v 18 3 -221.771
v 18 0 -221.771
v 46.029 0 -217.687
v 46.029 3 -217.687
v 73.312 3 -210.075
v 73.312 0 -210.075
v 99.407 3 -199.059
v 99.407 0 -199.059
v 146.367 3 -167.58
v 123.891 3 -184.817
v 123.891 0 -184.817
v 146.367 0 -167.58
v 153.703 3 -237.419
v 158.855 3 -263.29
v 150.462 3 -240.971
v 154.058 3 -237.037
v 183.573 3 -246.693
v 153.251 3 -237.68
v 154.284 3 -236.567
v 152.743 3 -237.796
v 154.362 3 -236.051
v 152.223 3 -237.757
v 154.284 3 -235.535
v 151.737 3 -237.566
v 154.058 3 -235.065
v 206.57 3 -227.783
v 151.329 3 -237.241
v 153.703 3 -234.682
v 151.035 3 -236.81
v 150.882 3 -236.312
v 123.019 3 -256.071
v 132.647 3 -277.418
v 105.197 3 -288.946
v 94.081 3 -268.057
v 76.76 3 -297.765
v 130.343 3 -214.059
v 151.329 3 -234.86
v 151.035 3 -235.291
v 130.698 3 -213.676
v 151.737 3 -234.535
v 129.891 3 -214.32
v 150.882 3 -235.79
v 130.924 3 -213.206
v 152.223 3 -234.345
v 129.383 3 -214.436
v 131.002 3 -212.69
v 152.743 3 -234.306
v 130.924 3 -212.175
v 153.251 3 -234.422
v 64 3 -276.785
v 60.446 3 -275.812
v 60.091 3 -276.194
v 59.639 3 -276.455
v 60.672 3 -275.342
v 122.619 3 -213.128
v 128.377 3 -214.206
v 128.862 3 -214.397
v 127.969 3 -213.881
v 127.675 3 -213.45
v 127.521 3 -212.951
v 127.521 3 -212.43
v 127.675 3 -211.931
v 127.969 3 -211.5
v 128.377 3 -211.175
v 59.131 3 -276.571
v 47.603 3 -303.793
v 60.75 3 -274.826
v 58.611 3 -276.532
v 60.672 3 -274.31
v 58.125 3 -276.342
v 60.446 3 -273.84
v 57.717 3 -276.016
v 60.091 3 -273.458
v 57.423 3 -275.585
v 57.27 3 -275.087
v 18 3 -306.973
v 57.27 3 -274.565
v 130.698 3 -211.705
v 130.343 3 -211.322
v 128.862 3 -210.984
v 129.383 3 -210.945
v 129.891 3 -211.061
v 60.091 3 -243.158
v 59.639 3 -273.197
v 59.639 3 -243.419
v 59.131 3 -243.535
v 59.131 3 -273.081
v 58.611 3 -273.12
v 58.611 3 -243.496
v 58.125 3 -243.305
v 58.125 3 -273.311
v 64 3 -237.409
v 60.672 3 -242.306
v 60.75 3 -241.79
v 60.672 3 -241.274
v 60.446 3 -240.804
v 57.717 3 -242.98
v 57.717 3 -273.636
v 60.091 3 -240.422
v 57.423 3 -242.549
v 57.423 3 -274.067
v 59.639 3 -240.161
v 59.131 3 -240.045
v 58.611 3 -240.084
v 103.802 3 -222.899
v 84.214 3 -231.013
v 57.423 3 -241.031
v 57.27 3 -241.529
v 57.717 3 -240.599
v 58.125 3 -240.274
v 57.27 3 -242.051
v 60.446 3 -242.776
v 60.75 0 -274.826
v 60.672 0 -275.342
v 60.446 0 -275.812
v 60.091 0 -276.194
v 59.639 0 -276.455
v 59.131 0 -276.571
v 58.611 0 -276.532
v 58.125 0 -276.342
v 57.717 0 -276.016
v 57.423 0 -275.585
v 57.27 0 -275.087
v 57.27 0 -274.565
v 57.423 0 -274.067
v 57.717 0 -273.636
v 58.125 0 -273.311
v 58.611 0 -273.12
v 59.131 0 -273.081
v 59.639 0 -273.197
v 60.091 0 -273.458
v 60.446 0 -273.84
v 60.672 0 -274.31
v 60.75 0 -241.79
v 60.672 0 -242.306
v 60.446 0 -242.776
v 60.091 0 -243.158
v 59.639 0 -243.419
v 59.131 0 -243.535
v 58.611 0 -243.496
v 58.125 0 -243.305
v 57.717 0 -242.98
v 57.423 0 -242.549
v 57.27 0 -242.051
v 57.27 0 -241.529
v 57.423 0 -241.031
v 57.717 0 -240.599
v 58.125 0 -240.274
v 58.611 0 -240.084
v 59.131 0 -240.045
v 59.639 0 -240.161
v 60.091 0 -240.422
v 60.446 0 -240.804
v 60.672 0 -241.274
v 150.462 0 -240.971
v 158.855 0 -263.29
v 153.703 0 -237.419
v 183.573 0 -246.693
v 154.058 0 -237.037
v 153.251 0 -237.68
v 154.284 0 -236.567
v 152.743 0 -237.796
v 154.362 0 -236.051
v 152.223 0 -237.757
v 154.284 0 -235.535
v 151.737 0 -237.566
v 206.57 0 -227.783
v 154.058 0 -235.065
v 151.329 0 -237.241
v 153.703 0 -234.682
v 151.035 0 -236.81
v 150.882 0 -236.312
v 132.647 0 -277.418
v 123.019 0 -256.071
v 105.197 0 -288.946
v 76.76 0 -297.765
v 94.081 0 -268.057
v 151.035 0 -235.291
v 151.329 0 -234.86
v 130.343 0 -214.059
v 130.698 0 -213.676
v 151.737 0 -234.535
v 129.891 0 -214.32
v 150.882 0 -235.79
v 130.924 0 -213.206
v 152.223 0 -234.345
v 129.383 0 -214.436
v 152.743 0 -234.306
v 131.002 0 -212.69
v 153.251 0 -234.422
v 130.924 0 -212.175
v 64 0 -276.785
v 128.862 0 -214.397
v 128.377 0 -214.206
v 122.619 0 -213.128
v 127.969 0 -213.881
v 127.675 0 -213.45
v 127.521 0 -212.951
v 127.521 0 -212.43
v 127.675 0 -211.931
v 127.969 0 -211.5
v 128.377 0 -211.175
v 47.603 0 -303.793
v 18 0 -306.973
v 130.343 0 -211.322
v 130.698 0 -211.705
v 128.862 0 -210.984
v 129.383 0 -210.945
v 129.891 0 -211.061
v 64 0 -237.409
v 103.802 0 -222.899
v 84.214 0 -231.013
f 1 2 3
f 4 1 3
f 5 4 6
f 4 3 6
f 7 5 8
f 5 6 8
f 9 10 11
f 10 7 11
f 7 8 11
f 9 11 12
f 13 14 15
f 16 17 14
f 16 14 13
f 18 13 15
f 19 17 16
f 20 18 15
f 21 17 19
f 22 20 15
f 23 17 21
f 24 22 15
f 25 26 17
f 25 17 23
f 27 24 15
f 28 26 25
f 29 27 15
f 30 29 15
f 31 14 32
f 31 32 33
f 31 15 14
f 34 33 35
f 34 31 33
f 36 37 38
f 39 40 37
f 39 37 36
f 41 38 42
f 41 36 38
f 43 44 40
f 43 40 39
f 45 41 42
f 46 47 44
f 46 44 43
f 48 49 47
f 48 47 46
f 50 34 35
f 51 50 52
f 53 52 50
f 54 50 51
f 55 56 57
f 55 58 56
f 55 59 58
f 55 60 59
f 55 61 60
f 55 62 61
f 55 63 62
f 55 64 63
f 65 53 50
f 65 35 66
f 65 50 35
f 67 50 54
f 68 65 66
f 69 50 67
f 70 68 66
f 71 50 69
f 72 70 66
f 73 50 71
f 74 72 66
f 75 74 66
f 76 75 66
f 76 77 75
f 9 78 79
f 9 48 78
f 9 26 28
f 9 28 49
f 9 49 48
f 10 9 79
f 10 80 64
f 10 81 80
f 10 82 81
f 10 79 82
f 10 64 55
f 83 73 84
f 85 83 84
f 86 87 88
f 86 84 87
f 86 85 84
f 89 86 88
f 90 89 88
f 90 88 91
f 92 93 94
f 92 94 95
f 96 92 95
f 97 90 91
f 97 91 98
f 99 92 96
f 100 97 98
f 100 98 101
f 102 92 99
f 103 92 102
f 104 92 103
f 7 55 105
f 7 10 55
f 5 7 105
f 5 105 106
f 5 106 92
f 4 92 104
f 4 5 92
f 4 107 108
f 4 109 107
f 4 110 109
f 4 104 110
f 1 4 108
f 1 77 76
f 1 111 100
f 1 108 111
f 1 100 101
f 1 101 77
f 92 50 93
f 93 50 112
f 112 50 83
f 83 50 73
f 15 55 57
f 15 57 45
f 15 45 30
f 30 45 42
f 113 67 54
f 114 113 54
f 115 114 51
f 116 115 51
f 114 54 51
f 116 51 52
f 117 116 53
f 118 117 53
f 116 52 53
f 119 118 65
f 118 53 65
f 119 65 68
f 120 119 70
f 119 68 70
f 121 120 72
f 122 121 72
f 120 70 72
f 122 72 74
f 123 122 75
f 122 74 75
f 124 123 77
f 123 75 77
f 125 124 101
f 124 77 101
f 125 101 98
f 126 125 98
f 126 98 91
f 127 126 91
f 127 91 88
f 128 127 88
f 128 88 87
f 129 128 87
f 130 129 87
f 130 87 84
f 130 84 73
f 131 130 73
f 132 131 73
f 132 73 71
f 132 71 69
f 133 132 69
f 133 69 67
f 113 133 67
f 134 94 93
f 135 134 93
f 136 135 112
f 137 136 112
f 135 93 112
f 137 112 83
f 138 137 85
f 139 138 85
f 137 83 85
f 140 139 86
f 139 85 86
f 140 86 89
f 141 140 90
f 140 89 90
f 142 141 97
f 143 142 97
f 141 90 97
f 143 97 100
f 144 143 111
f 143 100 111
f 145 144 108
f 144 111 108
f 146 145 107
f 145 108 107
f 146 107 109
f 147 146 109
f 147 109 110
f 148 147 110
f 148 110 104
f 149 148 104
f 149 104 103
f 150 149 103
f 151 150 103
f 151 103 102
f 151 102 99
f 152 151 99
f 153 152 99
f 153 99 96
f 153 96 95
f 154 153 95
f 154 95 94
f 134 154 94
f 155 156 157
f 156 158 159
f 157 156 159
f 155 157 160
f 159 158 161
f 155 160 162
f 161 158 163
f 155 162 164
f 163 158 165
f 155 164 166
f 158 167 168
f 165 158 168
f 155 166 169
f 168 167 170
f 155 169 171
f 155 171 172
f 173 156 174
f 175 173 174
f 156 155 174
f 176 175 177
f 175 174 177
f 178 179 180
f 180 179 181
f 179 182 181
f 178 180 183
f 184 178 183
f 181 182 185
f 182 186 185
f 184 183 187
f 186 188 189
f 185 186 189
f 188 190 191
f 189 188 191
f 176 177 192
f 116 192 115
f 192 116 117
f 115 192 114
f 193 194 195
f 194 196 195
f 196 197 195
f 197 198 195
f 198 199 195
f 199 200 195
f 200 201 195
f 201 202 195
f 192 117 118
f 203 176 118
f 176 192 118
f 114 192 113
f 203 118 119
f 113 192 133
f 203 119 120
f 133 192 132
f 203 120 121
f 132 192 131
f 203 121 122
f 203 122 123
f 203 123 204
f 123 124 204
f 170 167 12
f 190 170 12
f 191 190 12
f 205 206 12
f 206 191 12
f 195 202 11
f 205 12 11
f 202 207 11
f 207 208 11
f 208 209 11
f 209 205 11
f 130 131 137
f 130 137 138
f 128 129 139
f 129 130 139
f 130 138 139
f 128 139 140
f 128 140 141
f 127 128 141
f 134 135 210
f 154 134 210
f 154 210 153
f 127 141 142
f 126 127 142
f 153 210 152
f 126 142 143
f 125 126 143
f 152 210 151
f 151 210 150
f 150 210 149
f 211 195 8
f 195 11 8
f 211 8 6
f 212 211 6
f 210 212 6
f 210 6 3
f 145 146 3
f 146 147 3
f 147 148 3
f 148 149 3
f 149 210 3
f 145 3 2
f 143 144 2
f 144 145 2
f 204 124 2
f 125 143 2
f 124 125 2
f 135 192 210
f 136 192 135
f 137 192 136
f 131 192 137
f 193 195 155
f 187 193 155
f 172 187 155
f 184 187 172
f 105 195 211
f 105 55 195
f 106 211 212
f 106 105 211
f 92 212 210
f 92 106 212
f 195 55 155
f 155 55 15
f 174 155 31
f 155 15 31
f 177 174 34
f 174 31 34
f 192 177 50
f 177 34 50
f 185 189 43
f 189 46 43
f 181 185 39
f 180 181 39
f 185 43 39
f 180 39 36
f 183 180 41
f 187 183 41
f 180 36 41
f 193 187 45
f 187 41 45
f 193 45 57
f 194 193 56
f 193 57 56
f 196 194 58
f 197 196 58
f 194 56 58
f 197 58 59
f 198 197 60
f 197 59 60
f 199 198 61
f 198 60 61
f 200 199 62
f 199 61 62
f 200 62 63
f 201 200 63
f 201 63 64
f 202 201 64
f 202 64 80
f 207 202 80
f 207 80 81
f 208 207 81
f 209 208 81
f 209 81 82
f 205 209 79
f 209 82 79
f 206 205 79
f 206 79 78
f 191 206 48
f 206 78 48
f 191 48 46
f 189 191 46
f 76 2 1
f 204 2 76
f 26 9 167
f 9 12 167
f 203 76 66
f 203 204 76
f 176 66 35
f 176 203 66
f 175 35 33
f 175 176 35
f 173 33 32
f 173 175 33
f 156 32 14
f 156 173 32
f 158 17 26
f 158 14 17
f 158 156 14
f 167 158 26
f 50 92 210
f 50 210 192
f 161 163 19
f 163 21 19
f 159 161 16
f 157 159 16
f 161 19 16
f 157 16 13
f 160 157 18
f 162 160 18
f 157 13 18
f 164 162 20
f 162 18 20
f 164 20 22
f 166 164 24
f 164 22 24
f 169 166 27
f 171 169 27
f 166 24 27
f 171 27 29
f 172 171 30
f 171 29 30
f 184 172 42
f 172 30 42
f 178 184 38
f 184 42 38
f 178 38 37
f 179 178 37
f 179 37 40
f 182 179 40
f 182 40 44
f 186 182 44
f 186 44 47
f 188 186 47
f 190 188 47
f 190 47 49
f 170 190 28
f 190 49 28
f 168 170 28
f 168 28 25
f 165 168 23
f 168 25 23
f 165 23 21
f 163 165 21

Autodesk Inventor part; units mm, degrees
ref_plane "YZ Plane" through (0, 0, 0) normal (1, 0, 0) x (0, 1, 0)
ref_plane "XZ Plane" through (0, 0, 0) normal (0, 1, 0) x (-1, 0, 0)
ref_plane "XY Plane" through (0, 0, 0) normal (0, 0, 1) x (1, 0, 0)
sketch "Sketch1" plane through (0, 0, 0) normal (0, 1, 0) x (-1, 0, 0)
  circle A0 centre (0, 0) radius 215
  circle A1 centre (0, 0) radius 315
  line L0 (0, 0) -> (0, -315)
  line L1 (0, 0) -> (-222.7386, -222.7386)
  line L2 (-141.0509, -162.2641) -> (-211.8794, -233.0926)
  line L3 (-15, -214.4761) -> (-15, -314.6427)
  circle A2 centre (0, 0) radius 222.5
  circle A3 centre (0, 0) radius 307.5
  line L4 (-18, -214.2452) -> (-18, -314.4853)
  point P0 (-152.028, -152.028)
  point P1 (0, -215)
  point P2 (0, -312.5)
  point P3 (0, -217.5)
  point P4 (-153.7957, -153.7957)
  point P5 (-220.9709, -220.9709)
  point P6 (-210.1096, -231.3228)
  point P7 (-15, -312.1398)
  point P8 (-15, -216.9821)
  point P9 (-142.8229, -164.0361)
  point P10 (-206.5699, -227.7831)
  point P11 (-15, -307.1339)
  point P12 (-15, -221.9938)
  point P13 (-146.3667, -167.5799)
  point P14 (-18, -306.9727)
  point P15 (-18, -221.7707)
  dimension "d2" = 430
  dimension "d3" = 630
  dimension "d4" = 45
  dimension "d5" = 15
  dimension "d6" = 15
  dimension "d11" = 7.5
  dimension "d12" = 7.5
  dimension "d13" = 3
extrude "Extrusion1" add sketch "Sketch1" along normal blind 3 contours A2 L4 A3 L2
sketch "Sketch5" plane through (0, 3, 0) normal (0, 1, 0) x (1, 0, 0)
  arc A0 (146.3667, 167.5799) -> (18, 221.7707) centre (0, 0) ccw projected
  line L0 (146.3667, 167.5799) -> (206.5699, 227.7831) projected
  arc A1 (206.5699, 227.7831) -> (18, 306.9727) centre (0, 0) ccw projected
  line L1 (18, 306.9727) -> (18, 221.7707) projected
  circle A2 centre (0, 0) radius 297.5
  circle A3 centre (0, 0) radius 232.5
  line L2 (28, 296.1794) -> (28, 230.8078)
  line L3 (145.7715, 181.1268) -> (191.9425, 227.2979)
  line L4 (18, 306.9727) -> (18, 221.7707) projected
  line L5 (18, 296.955) -> (18, 231.8022)
  line L6 (146.3667, 167.5799) -> (206.5699, 227.7831) projected
  line L7 (199.4901, 220.7033) -> (153.4532, 174.6664)
  dimension "d43" = 10
  dimension "d44" = 10
  dimension "d45" = 10
  dimension "d46" = 10
sketch "Sketch6" plane through (0, 3, 0) normal (0, 1, 0) x (1, 0, 0)
  arc A0 (146.3667, 167.5799) -> (18, 221.7707) centre (0, 0) ccw projected
  line L0 (146.3667, 167.5799) -> (206.5699, 227.7831) projected
  arc A1 (206.5699, 227.7831) -> (18, 306.9727) centre (0, 0) ccw projected
  line L1 (18, 306.9727) -> (18, 221.7707) projected
  circle A2 centre (0, 0) radius 222.5
  circle A3 centre (0, 0) radius 309.5
  circle A4 centre (0, 0) radius 240
  circle A5 centre (0, 0) radius 290
  line L2 (18, 306.9727) -> (18, 221.7707) projected
  line L3 (18, 239.324) -> (18, 289.4408)
  line L4 (146.3667, 167.5799) -> (206.5699, 227.7831) projected
  line L5 (158.7672, 179.9804) -> (194.1799, 215.3931)
  line L6 (50, 234.7339) -> (50, 285.6571)
  line L7 (130.6266, 201.3373) -> (166.6348, 237.3454)
  line L8 (55, 233.6129) -> (55, 284.7367)
  line L9 (126.2984, 204.0802) -> (162.4484, 240.2301)
  circle A6 centre (0, 0) radius 245
  circle A7 centre (0, 0) radius 285
  line L10 (55, 274.8261) -> (59, 274.8261) construction
  line L11 (59, 274.8261) -> (59, 278.8261) construction
  line L12 (55, 241.7898) -> (59, 241.7898) construction
  line L13 (59, 241.7898) -> (59, 237.7898) construction
  line L14 (132.0804, 209.8621) -> (129.2519, 212.6905) construction
  line L15 (129.2519, 212.6905) -> (126.4235, 209.8621) construction
  line L16 (155.4405, 233.2223) -> (152.6121, 236.0507) construction
  line L17 (152.6121, 236.0507) -> (155.4405, 238.8791) construction
  circle A8 centre (152.6121, 236.0507) radius 1.75
  circle A9 centre (129.2519, 212.6905) radius 1.75
  circle A10 centre (59, 274.8261) radius 1.75
  circle A11 centre (59, 241.7898) radius 1.75
  line L18 (15, 221.9938) -> (15, 309.1363)
  line L19 (0, 449.6314) -> (0, -436.0219) projected
  point P0 (176.4736, 197.6868)
  dimension "d47" = 445
  dimension "d48" = 619
  dimension "d49" = 480
  dimension "d50" = 580
  dimension "d53" = 5
  dimension "d54" = 5
  dimension "d55" = 5
  dimension "d56" = 5
  dimension "d57" = 4
  dimension "d58" = 4
  dimension "d59" = 4
  dimension "d60" = 4
  dimension "d61" = 4
  dimension "d63" = 4
  dimension "d67" = 90
  dimension "d68" = 4
  dimension "d69" = 4
  dimension "d70" = 3.5
  dimension "d71" = 3.5
  dimension "d72" = 3.5
  dimension "d73" = 3.5
  dimension "d76" = 35
  dimension "d77" = 15
  dimension "d78" = 35
extrude "Extrusion4" cut sketch "Sketch6" against normal up to next contours A8 | A9 | A10 | A11
sketch "Sketch8" plane through (0, 3, 0) normal (0, 1, 0) x (1, 0, 0)
  circle A0 centre (129.2519, 212.6905) radius 1.75 projected
  circle A1 centre (59, 274.8261) radius 1.75 projected
  circle A2 centre (152.6121, 236.0507) radius 1.75 projected
  circle A3 centre (59, 241.7898) radius 1.75 projected
  arc A4 (146.3667, 167.5799) -> (18, 221.7707) centre (0, 0) ccw projected
  line L0 (146.3667, 167.5799) -> (206.5699, 227.7831) projected
  arc A5 (206.5699, 227.7831) -> (18, 306.9727) centre (0, 0) ccw projected
  line L1 (18, 306.9727) -> (18, 221.7707) projected
  circle A6 centre (129.2519, 212.6905) radius 1.75 projected
  circle A7 centre (59, 241.7898) radius 1.75 projected
  circle A8 centre (152.6121, 236.0507) radius 1.75 projected
  circle A9 centre (0, 0) radius 248.8841 construction
  circle A10 centre (59, 274.8261) radius 1.75 projected
  circle A11 centre (0, 0) radius 281.0879 construction
  circle A12 centre (0, 0) radius 245.8841
  circle A13 centre (0, 0) radius 284.0879
  line L2 (59, 241.7898) -> (59, 274.8261) construction
  line L3 (129.2519, 212.6905) -> (152.6121, 236.0507) construction
  line L4 (122.6187, 213.1283) -> (150.4617, 240.9714)
  line L5 (64, 237.409) -> (64, 276.785)
  dimension "d96" = 3
  dimension "d97" = 3
  dimension "d98" = 5
  dimension "d100" = 5
extrude "Extrusion5" cut sketch "Sketch8" against normal up to next contours A0 | A1 | A2 | A3 | A12 L5 A13 L4
properties part number "Battery Module Third Iteration" material "PLA Plastic"
